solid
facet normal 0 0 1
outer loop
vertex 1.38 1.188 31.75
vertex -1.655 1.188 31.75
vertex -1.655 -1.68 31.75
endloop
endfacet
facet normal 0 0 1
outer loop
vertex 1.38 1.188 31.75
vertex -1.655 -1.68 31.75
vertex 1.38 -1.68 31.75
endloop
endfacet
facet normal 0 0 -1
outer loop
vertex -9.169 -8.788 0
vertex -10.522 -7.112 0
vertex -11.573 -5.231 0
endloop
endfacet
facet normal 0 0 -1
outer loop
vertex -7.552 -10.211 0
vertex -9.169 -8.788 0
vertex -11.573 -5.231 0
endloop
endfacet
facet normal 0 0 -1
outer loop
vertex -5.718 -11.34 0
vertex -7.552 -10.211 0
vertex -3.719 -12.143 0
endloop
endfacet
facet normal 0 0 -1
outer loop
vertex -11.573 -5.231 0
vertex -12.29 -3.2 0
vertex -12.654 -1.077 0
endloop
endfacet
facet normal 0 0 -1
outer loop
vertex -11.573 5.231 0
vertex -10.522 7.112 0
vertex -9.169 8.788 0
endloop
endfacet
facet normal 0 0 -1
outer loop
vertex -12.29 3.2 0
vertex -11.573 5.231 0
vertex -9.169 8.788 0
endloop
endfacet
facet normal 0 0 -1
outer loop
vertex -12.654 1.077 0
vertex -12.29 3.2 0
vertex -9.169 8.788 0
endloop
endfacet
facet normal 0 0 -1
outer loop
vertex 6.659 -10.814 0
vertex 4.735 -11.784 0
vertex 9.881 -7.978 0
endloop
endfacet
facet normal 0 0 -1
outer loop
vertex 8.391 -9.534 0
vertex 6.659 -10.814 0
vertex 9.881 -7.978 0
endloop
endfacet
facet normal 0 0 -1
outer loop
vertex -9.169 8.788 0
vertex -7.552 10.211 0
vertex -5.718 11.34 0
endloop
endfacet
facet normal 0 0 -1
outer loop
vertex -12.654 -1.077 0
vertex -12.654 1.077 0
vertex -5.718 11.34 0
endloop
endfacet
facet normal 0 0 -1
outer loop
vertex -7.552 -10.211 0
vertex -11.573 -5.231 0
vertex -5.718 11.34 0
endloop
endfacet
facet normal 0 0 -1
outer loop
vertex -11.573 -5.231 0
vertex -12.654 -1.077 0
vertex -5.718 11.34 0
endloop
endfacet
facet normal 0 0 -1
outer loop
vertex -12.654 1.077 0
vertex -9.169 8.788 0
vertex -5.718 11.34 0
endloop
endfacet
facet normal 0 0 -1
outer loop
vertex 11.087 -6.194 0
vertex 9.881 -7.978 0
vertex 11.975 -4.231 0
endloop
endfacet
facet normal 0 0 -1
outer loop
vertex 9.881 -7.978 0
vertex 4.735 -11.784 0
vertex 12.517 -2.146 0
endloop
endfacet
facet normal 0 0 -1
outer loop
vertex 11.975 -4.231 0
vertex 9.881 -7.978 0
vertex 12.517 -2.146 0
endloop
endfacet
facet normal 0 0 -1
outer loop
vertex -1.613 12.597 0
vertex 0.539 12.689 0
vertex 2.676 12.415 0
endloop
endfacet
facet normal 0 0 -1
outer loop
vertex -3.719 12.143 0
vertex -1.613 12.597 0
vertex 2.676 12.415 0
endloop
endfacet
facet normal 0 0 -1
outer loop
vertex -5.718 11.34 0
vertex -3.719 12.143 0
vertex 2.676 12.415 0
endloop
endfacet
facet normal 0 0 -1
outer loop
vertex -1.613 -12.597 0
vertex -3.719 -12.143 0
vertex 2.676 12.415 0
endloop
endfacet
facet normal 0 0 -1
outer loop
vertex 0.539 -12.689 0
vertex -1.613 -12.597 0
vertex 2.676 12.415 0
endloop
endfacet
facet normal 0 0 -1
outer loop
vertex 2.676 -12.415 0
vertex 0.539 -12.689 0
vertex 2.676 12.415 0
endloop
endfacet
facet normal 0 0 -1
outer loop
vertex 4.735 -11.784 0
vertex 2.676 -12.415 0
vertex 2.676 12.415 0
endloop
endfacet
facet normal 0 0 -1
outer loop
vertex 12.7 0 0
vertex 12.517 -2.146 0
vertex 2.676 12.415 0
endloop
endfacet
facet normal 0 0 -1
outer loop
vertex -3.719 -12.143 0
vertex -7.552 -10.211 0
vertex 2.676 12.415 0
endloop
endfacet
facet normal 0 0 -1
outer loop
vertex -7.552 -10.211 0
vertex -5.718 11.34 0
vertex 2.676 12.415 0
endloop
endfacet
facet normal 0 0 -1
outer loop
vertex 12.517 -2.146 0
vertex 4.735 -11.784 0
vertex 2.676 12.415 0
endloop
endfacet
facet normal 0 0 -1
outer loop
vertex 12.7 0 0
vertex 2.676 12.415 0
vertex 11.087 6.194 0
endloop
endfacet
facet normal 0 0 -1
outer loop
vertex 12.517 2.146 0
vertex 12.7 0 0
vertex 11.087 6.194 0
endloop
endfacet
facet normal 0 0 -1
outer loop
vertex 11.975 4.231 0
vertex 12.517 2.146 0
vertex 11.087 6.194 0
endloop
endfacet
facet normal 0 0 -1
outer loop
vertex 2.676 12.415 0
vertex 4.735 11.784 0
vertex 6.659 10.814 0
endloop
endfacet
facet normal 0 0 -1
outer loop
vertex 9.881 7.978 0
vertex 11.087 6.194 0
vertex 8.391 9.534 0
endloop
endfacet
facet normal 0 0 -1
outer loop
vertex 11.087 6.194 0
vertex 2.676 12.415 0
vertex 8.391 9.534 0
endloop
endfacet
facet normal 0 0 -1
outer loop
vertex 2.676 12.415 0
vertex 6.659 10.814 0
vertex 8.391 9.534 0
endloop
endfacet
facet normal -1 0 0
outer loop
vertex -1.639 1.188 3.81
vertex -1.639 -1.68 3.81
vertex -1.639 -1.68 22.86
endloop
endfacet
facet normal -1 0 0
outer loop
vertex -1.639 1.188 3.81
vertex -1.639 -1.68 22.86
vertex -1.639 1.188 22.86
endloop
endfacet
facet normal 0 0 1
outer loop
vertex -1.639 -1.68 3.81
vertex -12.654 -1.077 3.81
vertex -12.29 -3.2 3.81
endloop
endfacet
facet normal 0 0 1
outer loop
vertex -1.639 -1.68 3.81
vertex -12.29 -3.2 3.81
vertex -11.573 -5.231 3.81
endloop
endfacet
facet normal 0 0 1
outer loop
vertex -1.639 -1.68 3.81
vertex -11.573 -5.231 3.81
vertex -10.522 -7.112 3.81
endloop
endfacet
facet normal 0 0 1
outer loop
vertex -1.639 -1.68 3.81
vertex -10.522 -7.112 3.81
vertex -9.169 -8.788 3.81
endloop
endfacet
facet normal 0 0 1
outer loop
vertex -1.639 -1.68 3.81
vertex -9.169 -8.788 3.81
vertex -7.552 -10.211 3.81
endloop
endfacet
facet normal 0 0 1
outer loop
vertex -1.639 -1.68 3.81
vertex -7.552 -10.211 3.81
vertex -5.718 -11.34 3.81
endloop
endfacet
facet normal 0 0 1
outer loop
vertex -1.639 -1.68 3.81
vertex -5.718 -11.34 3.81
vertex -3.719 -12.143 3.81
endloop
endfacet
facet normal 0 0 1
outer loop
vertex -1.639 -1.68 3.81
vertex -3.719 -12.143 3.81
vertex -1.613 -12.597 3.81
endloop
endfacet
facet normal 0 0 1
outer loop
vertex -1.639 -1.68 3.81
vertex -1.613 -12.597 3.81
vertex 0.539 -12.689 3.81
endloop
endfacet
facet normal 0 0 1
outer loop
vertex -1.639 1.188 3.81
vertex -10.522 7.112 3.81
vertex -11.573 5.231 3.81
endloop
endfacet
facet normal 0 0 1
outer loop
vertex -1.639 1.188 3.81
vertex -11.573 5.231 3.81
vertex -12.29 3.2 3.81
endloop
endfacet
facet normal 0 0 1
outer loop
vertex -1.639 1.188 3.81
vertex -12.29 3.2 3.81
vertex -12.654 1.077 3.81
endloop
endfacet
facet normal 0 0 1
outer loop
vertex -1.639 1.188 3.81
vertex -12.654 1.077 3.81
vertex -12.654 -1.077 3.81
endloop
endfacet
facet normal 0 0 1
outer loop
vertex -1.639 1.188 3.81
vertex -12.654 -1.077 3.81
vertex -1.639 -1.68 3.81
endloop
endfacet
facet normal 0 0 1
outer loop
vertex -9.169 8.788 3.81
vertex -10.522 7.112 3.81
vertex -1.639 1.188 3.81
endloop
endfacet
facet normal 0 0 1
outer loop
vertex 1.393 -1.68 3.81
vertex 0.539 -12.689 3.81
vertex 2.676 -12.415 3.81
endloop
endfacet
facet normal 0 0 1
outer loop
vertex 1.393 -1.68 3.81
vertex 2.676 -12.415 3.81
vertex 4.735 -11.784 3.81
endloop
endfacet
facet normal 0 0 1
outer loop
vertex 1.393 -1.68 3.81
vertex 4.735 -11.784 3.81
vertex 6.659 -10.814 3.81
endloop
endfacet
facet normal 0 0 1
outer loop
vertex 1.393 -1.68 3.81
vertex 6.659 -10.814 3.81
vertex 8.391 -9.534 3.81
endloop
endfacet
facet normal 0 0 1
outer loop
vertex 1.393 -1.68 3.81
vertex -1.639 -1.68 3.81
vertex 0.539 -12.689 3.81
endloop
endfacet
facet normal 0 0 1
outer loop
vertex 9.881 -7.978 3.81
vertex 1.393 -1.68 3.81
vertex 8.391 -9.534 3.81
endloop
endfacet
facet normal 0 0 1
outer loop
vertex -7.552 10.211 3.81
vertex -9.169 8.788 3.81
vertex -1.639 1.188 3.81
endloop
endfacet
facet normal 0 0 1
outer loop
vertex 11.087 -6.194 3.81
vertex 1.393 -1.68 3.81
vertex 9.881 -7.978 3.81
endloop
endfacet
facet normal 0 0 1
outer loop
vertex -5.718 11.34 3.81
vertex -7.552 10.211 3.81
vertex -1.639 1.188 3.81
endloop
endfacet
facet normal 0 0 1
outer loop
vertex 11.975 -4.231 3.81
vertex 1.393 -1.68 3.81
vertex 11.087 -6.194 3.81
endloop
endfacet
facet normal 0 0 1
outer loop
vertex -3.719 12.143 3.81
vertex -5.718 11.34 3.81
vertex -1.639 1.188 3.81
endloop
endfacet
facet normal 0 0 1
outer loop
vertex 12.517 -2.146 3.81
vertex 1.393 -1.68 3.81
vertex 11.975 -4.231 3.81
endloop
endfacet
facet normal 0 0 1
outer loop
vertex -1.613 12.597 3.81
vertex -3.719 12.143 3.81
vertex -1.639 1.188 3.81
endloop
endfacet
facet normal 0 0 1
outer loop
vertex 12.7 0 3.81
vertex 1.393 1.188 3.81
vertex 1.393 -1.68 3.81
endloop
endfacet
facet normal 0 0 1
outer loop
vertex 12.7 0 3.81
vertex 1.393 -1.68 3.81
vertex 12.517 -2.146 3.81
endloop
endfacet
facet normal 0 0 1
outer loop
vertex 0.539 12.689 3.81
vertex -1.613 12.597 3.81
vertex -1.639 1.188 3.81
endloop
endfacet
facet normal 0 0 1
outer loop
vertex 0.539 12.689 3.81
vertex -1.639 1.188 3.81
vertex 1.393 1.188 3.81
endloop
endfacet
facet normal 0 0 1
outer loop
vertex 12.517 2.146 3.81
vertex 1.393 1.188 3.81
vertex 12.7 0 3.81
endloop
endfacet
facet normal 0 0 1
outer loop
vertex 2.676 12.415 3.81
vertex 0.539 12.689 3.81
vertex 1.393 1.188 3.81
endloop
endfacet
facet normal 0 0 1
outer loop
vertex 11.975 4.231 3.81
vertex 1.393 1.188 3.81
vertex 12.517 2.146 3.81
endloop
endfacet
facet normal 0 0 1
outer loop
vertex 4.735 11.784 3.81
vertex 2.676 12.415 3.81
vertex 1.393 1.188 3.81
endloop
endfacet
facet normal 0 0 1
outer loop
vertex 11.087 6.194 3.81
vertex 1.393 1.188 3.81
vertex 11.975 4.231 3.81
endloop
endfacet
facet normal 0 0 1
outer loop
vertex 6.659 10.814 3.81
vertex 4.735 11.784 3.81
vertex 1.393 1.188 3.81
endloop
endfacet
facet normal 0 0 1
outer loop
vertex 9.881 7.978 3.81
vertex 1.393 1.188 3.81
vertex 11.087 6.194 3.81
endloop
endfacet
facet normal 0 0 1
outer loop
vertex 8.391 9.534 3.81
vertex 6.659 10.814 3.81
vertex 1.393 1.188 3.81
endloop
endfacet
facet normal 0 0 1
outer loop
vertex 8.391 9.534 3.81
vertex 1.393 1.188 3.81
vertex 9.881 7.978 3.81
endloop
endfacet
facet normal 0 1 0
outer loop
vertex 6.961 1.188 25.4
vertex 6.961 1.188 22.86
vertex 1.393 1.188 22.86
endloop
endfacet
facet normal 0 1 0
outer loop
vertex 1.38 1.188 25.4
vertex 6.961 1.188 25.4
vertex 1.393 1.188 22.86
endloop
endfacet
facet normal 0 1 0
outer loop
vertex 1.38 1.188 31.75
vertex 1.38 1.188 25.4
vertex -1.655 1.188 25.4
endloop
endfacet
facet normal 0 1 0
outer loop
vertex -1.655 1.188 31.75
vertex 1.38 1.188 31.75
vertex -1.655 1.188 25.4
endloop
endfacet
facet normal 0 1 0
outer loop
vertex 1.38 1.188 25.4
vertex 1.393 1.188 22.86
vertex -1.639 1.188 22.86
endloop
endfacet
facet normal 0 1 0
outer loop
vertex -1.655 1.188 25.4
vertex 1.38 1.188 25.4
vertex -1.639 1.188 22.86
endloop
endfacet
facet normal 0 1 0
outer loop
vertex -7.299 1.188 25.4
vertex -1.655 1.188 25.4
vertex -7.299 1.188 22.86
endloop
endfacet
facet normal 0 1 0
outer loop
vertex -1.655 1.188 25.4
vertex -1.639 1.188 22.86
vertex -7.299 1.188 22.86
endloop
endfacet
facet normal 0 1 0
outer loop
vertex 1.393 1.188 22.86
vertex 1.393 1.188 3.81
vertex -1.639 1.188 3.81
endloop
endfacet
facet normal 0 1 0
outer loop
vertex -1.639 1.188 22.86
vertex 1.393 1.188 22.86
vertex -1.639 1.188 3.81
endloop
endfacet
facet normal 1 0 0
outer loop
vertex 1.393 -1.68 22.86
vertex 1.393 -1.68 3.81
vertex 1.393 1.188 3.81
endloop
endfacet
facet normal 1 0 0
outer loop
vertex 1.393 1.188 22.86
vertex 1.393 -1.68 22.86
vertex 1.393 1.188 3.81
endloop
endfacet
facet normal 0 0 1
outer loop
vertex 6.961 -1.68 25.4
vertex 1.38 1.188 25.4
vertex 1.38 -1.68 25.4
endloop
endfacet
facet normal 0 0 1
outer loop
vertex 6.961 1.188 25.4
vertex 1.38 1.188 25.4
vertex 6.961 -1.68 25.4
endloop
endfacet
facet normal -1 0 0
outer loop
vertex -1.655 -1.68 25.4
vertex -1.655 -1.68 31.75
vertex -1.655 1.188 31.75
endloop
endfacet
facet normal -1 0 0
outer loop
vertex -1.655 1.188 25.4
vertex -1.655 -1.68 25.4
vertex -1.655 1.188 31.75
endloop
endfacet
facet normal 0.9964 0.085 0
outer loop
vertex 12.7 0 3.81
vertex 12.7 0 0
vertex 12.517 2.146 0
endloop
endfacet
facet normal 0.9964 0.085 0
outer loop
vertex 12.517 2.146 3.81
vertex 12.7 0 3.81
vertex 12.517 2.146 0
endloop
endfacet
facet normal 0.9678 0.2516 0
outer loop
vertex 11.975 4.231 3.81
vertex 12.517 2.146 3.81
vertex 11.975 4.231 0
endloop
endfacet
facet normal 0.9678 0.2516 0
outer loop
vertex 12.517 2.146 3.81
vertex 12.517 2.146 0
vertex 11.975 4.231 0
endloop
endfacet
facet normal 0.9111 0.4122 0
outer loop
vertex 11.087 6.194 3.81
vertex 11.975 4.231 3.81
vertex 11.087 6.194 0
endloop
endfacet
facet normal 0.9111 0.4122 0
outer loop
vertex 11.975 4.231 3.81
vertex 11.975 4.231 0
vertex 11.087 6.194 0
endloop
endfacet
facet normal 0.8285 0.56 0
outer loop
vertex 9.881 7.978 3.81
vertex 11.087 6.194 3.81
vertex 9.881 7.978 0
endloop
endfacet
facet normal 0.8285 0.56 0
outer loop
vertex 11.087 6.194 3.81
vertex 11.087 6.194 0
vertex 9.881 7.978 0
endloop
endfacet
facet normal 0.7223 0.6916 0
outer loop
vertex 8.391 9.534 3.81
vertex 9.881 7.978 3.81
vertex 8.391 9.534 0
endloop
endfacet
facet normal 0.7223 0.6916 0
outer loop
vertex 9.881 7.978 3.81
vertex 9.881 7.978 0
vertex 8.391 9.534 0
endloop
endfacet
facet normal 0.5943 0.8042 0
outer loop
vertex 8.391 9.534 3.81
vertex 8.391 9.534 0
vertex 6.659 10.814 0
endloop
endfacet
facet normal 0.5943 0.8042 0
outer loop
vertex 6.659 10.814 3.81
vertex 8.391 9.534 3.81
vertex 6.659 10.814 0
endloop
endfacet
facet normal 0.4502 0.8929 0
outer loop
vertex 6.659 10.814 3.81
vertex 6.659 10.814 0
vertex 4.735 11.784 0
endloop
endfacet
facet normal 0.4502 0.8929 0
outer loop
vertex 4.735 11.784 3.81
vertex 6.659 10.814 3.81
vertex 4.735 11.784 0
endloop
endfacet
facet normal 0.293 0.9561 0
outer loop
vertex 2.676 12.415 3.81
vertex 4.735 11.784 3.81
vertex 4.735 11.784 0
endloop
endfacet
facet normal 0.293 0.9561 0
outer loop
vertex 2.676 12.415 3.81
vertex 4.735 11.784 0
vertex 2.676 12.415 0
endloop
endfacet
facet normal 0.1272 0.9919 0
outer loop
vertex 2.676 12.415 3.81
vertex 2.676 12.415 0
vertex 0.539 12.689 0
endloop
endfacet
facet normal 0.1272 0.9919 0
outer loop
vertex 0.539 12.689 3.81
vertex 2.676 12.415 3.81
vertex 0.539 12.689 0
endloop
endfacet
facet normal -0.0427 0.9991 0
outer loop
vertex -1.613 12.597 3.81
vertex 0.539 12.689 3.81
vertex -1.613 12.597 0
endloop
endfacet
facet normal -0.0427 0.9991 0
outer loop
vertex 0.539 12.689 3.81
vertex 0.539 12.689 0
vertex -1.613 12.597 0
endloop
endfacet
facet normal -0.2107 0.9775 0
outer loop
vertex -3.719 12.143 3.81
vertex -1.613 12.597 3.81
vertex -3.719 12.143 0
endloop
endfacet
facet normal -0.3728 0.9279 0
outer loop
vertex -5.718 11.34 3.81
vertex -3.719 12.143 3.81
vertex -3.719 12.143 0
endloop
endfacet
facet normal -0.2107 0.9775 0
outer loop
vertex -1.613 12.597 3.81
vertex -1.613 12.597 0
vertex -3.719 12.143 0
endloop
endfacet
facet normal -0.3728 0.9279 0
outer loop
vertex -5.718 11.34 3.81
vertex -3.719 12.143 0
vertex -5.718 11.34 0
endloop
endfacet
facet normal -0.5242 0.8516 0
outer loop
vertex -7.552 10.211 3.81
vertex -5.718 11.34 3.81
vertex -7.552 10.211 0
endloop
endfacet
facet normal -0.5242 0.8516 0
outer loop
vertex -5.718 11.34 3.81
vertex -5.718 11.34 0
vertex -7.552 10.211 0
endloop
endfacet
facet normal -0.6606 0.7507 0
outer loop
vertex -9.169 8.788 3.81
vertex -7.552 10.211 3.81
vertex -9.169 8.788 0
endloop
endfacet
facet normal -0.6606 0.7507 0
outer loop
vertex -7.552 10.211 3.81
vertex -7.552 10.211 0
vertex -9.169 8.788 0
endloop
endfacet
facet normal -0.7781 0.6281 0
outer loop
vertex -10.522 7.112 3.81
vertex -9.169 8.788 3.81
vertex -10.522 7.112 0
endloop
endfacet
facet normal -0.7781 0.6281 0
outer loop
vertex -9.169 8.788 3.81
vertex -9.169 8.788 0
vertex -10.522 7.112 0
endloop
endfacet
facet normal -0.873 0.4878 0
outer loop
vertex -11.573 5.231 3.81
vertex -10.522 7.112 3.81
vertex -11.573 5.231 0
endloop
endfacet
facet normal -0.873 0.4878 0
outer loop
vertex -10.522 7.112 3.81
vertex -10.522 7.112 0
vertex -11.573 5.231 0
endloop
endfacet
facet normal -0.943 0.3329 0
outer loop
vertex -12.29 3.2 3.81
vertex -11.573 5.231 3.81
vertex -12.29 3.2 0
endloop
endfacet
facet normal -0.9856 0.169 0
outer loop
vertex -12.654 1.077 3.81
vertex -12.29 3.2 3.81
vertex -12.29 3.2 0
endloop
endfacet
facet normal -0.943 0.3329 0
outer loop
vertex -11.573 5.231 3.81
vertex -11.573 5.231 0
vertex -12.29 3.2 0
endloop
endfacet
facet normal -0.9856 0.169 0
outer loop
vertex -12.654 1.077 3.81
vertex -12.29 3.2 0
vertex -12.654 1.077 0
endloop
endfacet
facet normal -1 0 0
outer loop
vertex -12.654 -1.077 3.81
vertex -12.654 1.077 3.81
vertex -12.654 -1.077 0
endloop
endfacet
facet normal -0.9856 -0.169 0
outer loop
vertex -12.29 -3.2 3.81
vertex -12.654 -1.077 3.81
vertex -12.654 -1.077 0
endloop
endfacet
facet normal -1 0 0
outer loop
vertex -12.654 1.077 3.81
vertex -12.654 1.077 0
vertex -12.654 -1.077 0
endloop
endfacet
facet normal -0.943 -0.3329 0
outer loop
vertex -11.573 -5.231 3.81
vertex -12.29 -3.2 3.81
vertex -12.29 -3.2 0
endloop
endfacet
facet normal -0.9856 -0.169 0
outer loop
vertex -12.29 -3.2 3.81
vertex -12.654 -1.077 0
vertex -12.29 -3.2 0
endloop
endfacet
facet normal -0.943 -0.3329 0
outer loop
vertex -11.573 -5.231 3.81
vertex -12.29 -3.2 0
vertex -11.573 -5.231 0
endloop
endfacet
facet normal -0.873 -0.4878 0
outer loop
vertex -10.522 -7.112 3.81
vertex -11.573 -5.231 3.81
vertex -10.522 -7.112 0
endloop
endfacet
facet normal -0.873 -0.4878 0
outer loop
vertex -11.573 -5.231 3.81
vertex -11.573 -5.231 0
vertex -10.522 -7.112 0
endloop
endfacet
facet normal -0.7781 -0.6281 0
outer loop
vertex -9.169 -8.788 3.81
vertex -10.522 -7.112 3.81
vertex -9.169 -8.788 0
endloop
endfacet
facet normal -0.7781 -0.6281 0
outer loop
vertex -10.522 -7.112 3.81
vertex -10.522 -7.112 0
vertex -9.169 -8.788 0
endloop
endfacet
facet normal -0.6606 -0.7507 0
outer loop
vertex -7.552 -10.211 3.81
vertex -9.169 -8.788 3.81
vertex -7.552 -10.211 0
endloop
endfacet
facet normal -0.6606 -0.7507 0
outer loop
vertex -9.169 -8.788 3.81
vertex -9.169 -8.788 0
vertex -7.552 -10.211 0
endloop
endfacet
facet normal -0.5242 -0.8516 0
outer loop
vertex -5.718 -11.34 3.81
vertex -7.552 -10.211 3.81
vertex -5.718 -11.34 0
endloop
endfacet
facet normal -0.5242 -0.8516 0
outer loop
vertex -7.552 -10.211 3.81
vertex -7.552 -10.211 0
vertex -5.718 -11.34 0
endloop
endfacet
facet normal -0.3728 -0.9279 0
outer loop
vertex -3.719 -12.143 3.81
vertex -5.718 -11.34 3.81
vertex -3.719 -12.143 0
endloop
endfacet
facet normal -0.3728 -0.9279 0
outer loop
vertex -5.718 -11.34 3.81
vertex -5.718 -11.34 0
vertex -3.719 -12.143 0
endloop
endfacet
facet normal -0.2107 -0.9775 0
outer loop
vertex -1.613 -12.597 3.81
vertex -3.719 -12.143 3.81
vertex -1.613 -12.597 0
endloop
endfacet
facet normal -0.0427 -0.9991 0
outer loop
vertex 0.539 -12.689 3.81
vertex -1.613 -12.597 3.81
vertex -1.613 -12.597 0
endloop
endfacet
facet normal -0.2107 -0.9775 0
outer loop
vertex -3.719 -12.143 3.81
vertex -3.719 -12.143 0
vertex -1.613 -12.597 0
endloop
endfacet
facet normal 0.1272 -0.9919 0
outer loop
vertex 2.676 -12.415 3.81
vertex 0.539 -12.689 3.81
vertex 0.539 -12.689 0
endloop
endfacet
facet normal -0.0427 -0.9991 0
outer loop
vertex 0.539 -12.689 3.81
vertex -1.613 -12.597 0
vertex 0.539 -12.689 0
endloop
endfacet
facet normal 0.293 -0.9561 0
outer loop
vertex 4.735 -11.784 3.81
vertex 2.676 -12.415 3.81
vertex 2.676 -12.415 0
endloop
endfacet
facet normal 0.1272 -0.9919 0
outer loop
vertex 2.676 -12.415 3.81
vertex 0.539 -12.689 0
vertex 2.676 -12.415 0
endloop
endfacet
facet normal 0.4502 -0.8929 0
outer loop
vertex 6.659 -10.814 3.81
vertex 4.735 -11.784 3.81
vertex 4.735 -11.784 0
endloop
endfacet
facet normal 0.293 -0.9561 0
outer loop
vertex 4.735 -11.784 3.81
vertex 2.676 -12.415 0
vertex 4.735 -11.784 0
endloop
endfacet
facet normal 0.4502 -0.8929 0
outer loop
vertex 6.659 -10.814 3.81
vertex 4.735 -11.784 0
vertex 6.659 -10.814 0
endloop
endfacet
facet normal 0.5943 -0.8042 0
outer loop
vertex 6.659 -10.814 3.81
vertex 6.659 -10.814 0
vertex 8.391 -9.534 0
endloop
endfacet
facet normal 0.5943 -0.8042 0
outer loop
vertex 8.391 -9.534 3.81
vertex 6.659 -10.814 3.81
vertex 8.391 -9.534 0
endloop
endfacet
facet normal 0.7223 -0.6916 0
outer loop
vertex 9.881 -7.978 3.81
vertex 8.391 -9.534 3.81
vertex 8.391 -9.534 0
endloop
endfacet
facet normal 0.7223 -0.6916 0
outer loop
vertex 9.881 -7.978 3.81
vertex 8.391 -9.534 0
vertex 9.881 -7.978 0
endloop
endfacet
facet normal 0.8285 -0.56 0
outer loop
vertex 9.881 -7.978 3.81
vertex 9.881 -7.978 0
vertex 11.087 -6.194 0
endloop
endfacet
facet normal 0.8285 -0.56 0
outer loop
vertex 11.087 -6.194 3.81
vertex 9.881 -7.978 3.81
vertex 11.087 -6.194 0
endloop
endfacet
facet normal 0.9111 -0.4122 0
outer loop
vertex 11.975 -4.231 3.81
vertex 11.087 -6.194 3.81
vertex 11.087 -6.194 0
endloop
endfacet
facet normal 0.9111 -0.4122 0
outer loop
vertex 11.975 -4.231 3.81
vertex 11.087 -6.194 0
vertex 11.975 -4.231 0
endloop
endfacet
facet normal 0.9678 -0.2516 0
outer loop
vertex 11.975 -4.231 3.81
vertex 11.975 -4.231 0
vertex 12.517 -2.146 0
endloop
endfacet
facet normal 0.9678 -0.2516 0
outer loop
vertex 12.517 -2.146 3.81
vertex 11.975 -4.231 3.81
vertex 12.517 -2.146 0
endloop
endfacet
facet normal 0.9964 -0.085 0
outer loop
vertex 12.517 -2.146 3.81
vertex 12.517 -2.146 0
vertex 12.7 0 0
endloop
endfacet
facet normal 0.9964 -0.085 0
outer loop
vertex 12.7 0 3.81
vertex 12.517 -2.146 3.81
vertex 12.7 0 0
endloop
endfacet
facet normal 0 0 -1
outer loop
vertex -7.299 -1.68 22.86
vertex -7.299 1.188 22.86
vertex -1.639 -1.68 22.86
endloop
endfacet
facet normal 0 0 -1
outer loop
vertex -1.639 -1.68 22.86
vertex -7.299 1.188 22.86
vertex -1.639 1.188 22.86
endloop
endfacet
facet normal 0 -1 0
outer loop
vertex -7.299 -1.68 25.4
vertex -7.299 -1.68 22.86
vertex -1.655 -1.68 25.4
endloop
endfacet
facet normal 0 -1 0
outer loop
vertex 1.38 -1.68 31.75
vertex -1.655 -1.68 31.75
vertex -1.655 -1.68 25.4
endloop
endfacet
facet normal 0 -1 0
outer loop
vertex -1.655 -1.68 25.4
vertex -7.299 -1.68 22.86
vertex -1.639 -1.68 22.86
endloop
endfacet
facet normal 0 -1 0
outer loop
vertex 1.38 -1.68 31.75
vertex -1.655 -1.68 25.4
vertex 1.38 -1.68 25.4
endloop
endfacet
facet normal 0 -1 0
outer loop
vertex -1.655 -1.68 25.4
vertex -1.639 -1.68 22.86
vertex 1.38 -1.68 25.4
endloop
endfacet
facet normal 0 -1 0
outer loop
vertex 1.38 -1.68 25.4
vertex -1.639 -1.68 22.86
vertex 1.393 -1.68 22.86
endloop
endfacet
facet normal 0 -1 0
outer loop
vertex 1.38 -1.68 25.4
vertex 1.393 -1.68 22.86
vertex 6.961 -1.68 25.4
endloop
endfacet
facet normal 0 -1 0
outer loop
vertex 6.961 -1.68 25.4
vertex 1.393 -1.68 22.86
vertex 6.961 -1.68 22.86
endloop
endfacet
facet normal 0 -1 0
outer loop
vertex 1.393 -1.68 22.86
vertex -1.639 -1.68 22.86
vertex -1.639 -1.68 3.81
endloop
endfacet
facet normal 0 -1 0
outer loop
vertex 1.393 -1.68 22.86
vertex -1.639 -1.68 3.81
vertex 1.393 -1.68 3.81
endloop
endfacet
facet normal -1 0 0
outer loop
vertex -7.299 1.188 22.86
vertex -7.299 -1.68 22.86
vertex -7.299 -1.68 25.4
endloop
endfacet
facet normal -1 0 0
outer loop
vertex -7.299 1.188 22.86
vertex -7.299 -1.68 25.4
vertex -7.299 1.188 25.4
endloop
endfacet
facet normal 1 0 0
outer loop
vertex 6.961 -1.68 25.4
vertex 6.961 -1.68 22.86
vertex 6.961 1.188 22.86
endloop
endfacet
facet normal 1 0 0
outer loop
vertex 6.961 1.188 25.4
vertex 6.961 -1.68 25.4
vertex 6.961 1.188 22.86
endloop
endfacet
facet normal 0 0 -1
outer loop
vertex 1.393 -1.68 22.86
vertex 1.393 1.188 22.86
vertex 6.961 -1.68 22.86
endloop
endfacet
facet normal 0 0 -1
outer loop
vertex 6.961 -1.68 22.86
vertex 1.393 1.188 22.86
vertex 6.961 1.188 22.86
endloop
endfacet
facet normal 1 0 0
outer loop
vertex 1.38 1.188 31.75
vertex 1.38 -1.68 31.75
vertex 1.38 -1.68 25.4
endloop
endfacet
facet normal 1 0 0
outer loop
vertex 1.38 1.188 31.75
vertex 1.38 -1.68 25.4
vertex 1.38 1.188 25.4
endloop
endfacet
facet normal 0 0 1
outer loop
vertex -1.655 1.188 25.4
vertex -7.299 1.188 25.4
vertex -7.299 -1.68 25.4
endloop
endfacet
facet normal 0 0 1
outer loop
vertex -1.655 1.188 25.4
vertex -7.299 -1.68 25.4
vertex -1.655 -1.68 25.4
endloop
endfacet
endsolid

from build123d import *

# Parameters (mm, degrees)
F0_R     = 12.7
F1_DEPTH = 3.81
F2_W     = 3.0322148232
F2_H     = 2.8683111304
F3_DEPTH = 19.05
F4_W     = 5.6596440263
F4_H     = 2.8683111304
F4_W_2   = 3.0322148232
F4_W_3   = 5.5680392543
F5_DEPTH = 2.54
F6_W     = 3.0350781744
F6_H     = 2.8683111304
F7_DEPTH = 6.35


with BuildPart() as f1:
    # F0 (on Top) → F1 (new body)
    with BuildSketch(Plane.XY):
        Circle(F0_R)
    extrude(amount=F1_DEPTH)

    # F2 (on face) → F3 (join)
    with BuildSketch(Plane.XY.offset(3.81)):
        with Locations((-0.1229271875, -0.2458557137)):
            Rectangle(F2_W, F2_H)
    extrude(amount=F3_DEPTH)

    # F4 (on face) → F5 (join)
    with BuildSketch(Plane.XY.offset(22.86)):
        with Locations((-4.4688566122, -0.2458557137)):
            Rectangle(F4_W, F4_H)
        with Locations((-0.1229271875, -0.2458557137)):
            Rectangle(F4_W_2, F4_H)
        with Locations((4.1771998513, -0.2458557137)):
            Rectangle(F4_W_3, F4_H)
    extrude(amount=F5_DEPTH)

    # F6 (on face) → F7 (join)
    with BuildSketch(Plane.XY.offset(25.4)):
        with Locations((-0.1373158884, -0.2458557137)):
            Rectangle(F6_W, F6_H)
    extrude(amount=F7_DEPTH)


solid = f1.part
